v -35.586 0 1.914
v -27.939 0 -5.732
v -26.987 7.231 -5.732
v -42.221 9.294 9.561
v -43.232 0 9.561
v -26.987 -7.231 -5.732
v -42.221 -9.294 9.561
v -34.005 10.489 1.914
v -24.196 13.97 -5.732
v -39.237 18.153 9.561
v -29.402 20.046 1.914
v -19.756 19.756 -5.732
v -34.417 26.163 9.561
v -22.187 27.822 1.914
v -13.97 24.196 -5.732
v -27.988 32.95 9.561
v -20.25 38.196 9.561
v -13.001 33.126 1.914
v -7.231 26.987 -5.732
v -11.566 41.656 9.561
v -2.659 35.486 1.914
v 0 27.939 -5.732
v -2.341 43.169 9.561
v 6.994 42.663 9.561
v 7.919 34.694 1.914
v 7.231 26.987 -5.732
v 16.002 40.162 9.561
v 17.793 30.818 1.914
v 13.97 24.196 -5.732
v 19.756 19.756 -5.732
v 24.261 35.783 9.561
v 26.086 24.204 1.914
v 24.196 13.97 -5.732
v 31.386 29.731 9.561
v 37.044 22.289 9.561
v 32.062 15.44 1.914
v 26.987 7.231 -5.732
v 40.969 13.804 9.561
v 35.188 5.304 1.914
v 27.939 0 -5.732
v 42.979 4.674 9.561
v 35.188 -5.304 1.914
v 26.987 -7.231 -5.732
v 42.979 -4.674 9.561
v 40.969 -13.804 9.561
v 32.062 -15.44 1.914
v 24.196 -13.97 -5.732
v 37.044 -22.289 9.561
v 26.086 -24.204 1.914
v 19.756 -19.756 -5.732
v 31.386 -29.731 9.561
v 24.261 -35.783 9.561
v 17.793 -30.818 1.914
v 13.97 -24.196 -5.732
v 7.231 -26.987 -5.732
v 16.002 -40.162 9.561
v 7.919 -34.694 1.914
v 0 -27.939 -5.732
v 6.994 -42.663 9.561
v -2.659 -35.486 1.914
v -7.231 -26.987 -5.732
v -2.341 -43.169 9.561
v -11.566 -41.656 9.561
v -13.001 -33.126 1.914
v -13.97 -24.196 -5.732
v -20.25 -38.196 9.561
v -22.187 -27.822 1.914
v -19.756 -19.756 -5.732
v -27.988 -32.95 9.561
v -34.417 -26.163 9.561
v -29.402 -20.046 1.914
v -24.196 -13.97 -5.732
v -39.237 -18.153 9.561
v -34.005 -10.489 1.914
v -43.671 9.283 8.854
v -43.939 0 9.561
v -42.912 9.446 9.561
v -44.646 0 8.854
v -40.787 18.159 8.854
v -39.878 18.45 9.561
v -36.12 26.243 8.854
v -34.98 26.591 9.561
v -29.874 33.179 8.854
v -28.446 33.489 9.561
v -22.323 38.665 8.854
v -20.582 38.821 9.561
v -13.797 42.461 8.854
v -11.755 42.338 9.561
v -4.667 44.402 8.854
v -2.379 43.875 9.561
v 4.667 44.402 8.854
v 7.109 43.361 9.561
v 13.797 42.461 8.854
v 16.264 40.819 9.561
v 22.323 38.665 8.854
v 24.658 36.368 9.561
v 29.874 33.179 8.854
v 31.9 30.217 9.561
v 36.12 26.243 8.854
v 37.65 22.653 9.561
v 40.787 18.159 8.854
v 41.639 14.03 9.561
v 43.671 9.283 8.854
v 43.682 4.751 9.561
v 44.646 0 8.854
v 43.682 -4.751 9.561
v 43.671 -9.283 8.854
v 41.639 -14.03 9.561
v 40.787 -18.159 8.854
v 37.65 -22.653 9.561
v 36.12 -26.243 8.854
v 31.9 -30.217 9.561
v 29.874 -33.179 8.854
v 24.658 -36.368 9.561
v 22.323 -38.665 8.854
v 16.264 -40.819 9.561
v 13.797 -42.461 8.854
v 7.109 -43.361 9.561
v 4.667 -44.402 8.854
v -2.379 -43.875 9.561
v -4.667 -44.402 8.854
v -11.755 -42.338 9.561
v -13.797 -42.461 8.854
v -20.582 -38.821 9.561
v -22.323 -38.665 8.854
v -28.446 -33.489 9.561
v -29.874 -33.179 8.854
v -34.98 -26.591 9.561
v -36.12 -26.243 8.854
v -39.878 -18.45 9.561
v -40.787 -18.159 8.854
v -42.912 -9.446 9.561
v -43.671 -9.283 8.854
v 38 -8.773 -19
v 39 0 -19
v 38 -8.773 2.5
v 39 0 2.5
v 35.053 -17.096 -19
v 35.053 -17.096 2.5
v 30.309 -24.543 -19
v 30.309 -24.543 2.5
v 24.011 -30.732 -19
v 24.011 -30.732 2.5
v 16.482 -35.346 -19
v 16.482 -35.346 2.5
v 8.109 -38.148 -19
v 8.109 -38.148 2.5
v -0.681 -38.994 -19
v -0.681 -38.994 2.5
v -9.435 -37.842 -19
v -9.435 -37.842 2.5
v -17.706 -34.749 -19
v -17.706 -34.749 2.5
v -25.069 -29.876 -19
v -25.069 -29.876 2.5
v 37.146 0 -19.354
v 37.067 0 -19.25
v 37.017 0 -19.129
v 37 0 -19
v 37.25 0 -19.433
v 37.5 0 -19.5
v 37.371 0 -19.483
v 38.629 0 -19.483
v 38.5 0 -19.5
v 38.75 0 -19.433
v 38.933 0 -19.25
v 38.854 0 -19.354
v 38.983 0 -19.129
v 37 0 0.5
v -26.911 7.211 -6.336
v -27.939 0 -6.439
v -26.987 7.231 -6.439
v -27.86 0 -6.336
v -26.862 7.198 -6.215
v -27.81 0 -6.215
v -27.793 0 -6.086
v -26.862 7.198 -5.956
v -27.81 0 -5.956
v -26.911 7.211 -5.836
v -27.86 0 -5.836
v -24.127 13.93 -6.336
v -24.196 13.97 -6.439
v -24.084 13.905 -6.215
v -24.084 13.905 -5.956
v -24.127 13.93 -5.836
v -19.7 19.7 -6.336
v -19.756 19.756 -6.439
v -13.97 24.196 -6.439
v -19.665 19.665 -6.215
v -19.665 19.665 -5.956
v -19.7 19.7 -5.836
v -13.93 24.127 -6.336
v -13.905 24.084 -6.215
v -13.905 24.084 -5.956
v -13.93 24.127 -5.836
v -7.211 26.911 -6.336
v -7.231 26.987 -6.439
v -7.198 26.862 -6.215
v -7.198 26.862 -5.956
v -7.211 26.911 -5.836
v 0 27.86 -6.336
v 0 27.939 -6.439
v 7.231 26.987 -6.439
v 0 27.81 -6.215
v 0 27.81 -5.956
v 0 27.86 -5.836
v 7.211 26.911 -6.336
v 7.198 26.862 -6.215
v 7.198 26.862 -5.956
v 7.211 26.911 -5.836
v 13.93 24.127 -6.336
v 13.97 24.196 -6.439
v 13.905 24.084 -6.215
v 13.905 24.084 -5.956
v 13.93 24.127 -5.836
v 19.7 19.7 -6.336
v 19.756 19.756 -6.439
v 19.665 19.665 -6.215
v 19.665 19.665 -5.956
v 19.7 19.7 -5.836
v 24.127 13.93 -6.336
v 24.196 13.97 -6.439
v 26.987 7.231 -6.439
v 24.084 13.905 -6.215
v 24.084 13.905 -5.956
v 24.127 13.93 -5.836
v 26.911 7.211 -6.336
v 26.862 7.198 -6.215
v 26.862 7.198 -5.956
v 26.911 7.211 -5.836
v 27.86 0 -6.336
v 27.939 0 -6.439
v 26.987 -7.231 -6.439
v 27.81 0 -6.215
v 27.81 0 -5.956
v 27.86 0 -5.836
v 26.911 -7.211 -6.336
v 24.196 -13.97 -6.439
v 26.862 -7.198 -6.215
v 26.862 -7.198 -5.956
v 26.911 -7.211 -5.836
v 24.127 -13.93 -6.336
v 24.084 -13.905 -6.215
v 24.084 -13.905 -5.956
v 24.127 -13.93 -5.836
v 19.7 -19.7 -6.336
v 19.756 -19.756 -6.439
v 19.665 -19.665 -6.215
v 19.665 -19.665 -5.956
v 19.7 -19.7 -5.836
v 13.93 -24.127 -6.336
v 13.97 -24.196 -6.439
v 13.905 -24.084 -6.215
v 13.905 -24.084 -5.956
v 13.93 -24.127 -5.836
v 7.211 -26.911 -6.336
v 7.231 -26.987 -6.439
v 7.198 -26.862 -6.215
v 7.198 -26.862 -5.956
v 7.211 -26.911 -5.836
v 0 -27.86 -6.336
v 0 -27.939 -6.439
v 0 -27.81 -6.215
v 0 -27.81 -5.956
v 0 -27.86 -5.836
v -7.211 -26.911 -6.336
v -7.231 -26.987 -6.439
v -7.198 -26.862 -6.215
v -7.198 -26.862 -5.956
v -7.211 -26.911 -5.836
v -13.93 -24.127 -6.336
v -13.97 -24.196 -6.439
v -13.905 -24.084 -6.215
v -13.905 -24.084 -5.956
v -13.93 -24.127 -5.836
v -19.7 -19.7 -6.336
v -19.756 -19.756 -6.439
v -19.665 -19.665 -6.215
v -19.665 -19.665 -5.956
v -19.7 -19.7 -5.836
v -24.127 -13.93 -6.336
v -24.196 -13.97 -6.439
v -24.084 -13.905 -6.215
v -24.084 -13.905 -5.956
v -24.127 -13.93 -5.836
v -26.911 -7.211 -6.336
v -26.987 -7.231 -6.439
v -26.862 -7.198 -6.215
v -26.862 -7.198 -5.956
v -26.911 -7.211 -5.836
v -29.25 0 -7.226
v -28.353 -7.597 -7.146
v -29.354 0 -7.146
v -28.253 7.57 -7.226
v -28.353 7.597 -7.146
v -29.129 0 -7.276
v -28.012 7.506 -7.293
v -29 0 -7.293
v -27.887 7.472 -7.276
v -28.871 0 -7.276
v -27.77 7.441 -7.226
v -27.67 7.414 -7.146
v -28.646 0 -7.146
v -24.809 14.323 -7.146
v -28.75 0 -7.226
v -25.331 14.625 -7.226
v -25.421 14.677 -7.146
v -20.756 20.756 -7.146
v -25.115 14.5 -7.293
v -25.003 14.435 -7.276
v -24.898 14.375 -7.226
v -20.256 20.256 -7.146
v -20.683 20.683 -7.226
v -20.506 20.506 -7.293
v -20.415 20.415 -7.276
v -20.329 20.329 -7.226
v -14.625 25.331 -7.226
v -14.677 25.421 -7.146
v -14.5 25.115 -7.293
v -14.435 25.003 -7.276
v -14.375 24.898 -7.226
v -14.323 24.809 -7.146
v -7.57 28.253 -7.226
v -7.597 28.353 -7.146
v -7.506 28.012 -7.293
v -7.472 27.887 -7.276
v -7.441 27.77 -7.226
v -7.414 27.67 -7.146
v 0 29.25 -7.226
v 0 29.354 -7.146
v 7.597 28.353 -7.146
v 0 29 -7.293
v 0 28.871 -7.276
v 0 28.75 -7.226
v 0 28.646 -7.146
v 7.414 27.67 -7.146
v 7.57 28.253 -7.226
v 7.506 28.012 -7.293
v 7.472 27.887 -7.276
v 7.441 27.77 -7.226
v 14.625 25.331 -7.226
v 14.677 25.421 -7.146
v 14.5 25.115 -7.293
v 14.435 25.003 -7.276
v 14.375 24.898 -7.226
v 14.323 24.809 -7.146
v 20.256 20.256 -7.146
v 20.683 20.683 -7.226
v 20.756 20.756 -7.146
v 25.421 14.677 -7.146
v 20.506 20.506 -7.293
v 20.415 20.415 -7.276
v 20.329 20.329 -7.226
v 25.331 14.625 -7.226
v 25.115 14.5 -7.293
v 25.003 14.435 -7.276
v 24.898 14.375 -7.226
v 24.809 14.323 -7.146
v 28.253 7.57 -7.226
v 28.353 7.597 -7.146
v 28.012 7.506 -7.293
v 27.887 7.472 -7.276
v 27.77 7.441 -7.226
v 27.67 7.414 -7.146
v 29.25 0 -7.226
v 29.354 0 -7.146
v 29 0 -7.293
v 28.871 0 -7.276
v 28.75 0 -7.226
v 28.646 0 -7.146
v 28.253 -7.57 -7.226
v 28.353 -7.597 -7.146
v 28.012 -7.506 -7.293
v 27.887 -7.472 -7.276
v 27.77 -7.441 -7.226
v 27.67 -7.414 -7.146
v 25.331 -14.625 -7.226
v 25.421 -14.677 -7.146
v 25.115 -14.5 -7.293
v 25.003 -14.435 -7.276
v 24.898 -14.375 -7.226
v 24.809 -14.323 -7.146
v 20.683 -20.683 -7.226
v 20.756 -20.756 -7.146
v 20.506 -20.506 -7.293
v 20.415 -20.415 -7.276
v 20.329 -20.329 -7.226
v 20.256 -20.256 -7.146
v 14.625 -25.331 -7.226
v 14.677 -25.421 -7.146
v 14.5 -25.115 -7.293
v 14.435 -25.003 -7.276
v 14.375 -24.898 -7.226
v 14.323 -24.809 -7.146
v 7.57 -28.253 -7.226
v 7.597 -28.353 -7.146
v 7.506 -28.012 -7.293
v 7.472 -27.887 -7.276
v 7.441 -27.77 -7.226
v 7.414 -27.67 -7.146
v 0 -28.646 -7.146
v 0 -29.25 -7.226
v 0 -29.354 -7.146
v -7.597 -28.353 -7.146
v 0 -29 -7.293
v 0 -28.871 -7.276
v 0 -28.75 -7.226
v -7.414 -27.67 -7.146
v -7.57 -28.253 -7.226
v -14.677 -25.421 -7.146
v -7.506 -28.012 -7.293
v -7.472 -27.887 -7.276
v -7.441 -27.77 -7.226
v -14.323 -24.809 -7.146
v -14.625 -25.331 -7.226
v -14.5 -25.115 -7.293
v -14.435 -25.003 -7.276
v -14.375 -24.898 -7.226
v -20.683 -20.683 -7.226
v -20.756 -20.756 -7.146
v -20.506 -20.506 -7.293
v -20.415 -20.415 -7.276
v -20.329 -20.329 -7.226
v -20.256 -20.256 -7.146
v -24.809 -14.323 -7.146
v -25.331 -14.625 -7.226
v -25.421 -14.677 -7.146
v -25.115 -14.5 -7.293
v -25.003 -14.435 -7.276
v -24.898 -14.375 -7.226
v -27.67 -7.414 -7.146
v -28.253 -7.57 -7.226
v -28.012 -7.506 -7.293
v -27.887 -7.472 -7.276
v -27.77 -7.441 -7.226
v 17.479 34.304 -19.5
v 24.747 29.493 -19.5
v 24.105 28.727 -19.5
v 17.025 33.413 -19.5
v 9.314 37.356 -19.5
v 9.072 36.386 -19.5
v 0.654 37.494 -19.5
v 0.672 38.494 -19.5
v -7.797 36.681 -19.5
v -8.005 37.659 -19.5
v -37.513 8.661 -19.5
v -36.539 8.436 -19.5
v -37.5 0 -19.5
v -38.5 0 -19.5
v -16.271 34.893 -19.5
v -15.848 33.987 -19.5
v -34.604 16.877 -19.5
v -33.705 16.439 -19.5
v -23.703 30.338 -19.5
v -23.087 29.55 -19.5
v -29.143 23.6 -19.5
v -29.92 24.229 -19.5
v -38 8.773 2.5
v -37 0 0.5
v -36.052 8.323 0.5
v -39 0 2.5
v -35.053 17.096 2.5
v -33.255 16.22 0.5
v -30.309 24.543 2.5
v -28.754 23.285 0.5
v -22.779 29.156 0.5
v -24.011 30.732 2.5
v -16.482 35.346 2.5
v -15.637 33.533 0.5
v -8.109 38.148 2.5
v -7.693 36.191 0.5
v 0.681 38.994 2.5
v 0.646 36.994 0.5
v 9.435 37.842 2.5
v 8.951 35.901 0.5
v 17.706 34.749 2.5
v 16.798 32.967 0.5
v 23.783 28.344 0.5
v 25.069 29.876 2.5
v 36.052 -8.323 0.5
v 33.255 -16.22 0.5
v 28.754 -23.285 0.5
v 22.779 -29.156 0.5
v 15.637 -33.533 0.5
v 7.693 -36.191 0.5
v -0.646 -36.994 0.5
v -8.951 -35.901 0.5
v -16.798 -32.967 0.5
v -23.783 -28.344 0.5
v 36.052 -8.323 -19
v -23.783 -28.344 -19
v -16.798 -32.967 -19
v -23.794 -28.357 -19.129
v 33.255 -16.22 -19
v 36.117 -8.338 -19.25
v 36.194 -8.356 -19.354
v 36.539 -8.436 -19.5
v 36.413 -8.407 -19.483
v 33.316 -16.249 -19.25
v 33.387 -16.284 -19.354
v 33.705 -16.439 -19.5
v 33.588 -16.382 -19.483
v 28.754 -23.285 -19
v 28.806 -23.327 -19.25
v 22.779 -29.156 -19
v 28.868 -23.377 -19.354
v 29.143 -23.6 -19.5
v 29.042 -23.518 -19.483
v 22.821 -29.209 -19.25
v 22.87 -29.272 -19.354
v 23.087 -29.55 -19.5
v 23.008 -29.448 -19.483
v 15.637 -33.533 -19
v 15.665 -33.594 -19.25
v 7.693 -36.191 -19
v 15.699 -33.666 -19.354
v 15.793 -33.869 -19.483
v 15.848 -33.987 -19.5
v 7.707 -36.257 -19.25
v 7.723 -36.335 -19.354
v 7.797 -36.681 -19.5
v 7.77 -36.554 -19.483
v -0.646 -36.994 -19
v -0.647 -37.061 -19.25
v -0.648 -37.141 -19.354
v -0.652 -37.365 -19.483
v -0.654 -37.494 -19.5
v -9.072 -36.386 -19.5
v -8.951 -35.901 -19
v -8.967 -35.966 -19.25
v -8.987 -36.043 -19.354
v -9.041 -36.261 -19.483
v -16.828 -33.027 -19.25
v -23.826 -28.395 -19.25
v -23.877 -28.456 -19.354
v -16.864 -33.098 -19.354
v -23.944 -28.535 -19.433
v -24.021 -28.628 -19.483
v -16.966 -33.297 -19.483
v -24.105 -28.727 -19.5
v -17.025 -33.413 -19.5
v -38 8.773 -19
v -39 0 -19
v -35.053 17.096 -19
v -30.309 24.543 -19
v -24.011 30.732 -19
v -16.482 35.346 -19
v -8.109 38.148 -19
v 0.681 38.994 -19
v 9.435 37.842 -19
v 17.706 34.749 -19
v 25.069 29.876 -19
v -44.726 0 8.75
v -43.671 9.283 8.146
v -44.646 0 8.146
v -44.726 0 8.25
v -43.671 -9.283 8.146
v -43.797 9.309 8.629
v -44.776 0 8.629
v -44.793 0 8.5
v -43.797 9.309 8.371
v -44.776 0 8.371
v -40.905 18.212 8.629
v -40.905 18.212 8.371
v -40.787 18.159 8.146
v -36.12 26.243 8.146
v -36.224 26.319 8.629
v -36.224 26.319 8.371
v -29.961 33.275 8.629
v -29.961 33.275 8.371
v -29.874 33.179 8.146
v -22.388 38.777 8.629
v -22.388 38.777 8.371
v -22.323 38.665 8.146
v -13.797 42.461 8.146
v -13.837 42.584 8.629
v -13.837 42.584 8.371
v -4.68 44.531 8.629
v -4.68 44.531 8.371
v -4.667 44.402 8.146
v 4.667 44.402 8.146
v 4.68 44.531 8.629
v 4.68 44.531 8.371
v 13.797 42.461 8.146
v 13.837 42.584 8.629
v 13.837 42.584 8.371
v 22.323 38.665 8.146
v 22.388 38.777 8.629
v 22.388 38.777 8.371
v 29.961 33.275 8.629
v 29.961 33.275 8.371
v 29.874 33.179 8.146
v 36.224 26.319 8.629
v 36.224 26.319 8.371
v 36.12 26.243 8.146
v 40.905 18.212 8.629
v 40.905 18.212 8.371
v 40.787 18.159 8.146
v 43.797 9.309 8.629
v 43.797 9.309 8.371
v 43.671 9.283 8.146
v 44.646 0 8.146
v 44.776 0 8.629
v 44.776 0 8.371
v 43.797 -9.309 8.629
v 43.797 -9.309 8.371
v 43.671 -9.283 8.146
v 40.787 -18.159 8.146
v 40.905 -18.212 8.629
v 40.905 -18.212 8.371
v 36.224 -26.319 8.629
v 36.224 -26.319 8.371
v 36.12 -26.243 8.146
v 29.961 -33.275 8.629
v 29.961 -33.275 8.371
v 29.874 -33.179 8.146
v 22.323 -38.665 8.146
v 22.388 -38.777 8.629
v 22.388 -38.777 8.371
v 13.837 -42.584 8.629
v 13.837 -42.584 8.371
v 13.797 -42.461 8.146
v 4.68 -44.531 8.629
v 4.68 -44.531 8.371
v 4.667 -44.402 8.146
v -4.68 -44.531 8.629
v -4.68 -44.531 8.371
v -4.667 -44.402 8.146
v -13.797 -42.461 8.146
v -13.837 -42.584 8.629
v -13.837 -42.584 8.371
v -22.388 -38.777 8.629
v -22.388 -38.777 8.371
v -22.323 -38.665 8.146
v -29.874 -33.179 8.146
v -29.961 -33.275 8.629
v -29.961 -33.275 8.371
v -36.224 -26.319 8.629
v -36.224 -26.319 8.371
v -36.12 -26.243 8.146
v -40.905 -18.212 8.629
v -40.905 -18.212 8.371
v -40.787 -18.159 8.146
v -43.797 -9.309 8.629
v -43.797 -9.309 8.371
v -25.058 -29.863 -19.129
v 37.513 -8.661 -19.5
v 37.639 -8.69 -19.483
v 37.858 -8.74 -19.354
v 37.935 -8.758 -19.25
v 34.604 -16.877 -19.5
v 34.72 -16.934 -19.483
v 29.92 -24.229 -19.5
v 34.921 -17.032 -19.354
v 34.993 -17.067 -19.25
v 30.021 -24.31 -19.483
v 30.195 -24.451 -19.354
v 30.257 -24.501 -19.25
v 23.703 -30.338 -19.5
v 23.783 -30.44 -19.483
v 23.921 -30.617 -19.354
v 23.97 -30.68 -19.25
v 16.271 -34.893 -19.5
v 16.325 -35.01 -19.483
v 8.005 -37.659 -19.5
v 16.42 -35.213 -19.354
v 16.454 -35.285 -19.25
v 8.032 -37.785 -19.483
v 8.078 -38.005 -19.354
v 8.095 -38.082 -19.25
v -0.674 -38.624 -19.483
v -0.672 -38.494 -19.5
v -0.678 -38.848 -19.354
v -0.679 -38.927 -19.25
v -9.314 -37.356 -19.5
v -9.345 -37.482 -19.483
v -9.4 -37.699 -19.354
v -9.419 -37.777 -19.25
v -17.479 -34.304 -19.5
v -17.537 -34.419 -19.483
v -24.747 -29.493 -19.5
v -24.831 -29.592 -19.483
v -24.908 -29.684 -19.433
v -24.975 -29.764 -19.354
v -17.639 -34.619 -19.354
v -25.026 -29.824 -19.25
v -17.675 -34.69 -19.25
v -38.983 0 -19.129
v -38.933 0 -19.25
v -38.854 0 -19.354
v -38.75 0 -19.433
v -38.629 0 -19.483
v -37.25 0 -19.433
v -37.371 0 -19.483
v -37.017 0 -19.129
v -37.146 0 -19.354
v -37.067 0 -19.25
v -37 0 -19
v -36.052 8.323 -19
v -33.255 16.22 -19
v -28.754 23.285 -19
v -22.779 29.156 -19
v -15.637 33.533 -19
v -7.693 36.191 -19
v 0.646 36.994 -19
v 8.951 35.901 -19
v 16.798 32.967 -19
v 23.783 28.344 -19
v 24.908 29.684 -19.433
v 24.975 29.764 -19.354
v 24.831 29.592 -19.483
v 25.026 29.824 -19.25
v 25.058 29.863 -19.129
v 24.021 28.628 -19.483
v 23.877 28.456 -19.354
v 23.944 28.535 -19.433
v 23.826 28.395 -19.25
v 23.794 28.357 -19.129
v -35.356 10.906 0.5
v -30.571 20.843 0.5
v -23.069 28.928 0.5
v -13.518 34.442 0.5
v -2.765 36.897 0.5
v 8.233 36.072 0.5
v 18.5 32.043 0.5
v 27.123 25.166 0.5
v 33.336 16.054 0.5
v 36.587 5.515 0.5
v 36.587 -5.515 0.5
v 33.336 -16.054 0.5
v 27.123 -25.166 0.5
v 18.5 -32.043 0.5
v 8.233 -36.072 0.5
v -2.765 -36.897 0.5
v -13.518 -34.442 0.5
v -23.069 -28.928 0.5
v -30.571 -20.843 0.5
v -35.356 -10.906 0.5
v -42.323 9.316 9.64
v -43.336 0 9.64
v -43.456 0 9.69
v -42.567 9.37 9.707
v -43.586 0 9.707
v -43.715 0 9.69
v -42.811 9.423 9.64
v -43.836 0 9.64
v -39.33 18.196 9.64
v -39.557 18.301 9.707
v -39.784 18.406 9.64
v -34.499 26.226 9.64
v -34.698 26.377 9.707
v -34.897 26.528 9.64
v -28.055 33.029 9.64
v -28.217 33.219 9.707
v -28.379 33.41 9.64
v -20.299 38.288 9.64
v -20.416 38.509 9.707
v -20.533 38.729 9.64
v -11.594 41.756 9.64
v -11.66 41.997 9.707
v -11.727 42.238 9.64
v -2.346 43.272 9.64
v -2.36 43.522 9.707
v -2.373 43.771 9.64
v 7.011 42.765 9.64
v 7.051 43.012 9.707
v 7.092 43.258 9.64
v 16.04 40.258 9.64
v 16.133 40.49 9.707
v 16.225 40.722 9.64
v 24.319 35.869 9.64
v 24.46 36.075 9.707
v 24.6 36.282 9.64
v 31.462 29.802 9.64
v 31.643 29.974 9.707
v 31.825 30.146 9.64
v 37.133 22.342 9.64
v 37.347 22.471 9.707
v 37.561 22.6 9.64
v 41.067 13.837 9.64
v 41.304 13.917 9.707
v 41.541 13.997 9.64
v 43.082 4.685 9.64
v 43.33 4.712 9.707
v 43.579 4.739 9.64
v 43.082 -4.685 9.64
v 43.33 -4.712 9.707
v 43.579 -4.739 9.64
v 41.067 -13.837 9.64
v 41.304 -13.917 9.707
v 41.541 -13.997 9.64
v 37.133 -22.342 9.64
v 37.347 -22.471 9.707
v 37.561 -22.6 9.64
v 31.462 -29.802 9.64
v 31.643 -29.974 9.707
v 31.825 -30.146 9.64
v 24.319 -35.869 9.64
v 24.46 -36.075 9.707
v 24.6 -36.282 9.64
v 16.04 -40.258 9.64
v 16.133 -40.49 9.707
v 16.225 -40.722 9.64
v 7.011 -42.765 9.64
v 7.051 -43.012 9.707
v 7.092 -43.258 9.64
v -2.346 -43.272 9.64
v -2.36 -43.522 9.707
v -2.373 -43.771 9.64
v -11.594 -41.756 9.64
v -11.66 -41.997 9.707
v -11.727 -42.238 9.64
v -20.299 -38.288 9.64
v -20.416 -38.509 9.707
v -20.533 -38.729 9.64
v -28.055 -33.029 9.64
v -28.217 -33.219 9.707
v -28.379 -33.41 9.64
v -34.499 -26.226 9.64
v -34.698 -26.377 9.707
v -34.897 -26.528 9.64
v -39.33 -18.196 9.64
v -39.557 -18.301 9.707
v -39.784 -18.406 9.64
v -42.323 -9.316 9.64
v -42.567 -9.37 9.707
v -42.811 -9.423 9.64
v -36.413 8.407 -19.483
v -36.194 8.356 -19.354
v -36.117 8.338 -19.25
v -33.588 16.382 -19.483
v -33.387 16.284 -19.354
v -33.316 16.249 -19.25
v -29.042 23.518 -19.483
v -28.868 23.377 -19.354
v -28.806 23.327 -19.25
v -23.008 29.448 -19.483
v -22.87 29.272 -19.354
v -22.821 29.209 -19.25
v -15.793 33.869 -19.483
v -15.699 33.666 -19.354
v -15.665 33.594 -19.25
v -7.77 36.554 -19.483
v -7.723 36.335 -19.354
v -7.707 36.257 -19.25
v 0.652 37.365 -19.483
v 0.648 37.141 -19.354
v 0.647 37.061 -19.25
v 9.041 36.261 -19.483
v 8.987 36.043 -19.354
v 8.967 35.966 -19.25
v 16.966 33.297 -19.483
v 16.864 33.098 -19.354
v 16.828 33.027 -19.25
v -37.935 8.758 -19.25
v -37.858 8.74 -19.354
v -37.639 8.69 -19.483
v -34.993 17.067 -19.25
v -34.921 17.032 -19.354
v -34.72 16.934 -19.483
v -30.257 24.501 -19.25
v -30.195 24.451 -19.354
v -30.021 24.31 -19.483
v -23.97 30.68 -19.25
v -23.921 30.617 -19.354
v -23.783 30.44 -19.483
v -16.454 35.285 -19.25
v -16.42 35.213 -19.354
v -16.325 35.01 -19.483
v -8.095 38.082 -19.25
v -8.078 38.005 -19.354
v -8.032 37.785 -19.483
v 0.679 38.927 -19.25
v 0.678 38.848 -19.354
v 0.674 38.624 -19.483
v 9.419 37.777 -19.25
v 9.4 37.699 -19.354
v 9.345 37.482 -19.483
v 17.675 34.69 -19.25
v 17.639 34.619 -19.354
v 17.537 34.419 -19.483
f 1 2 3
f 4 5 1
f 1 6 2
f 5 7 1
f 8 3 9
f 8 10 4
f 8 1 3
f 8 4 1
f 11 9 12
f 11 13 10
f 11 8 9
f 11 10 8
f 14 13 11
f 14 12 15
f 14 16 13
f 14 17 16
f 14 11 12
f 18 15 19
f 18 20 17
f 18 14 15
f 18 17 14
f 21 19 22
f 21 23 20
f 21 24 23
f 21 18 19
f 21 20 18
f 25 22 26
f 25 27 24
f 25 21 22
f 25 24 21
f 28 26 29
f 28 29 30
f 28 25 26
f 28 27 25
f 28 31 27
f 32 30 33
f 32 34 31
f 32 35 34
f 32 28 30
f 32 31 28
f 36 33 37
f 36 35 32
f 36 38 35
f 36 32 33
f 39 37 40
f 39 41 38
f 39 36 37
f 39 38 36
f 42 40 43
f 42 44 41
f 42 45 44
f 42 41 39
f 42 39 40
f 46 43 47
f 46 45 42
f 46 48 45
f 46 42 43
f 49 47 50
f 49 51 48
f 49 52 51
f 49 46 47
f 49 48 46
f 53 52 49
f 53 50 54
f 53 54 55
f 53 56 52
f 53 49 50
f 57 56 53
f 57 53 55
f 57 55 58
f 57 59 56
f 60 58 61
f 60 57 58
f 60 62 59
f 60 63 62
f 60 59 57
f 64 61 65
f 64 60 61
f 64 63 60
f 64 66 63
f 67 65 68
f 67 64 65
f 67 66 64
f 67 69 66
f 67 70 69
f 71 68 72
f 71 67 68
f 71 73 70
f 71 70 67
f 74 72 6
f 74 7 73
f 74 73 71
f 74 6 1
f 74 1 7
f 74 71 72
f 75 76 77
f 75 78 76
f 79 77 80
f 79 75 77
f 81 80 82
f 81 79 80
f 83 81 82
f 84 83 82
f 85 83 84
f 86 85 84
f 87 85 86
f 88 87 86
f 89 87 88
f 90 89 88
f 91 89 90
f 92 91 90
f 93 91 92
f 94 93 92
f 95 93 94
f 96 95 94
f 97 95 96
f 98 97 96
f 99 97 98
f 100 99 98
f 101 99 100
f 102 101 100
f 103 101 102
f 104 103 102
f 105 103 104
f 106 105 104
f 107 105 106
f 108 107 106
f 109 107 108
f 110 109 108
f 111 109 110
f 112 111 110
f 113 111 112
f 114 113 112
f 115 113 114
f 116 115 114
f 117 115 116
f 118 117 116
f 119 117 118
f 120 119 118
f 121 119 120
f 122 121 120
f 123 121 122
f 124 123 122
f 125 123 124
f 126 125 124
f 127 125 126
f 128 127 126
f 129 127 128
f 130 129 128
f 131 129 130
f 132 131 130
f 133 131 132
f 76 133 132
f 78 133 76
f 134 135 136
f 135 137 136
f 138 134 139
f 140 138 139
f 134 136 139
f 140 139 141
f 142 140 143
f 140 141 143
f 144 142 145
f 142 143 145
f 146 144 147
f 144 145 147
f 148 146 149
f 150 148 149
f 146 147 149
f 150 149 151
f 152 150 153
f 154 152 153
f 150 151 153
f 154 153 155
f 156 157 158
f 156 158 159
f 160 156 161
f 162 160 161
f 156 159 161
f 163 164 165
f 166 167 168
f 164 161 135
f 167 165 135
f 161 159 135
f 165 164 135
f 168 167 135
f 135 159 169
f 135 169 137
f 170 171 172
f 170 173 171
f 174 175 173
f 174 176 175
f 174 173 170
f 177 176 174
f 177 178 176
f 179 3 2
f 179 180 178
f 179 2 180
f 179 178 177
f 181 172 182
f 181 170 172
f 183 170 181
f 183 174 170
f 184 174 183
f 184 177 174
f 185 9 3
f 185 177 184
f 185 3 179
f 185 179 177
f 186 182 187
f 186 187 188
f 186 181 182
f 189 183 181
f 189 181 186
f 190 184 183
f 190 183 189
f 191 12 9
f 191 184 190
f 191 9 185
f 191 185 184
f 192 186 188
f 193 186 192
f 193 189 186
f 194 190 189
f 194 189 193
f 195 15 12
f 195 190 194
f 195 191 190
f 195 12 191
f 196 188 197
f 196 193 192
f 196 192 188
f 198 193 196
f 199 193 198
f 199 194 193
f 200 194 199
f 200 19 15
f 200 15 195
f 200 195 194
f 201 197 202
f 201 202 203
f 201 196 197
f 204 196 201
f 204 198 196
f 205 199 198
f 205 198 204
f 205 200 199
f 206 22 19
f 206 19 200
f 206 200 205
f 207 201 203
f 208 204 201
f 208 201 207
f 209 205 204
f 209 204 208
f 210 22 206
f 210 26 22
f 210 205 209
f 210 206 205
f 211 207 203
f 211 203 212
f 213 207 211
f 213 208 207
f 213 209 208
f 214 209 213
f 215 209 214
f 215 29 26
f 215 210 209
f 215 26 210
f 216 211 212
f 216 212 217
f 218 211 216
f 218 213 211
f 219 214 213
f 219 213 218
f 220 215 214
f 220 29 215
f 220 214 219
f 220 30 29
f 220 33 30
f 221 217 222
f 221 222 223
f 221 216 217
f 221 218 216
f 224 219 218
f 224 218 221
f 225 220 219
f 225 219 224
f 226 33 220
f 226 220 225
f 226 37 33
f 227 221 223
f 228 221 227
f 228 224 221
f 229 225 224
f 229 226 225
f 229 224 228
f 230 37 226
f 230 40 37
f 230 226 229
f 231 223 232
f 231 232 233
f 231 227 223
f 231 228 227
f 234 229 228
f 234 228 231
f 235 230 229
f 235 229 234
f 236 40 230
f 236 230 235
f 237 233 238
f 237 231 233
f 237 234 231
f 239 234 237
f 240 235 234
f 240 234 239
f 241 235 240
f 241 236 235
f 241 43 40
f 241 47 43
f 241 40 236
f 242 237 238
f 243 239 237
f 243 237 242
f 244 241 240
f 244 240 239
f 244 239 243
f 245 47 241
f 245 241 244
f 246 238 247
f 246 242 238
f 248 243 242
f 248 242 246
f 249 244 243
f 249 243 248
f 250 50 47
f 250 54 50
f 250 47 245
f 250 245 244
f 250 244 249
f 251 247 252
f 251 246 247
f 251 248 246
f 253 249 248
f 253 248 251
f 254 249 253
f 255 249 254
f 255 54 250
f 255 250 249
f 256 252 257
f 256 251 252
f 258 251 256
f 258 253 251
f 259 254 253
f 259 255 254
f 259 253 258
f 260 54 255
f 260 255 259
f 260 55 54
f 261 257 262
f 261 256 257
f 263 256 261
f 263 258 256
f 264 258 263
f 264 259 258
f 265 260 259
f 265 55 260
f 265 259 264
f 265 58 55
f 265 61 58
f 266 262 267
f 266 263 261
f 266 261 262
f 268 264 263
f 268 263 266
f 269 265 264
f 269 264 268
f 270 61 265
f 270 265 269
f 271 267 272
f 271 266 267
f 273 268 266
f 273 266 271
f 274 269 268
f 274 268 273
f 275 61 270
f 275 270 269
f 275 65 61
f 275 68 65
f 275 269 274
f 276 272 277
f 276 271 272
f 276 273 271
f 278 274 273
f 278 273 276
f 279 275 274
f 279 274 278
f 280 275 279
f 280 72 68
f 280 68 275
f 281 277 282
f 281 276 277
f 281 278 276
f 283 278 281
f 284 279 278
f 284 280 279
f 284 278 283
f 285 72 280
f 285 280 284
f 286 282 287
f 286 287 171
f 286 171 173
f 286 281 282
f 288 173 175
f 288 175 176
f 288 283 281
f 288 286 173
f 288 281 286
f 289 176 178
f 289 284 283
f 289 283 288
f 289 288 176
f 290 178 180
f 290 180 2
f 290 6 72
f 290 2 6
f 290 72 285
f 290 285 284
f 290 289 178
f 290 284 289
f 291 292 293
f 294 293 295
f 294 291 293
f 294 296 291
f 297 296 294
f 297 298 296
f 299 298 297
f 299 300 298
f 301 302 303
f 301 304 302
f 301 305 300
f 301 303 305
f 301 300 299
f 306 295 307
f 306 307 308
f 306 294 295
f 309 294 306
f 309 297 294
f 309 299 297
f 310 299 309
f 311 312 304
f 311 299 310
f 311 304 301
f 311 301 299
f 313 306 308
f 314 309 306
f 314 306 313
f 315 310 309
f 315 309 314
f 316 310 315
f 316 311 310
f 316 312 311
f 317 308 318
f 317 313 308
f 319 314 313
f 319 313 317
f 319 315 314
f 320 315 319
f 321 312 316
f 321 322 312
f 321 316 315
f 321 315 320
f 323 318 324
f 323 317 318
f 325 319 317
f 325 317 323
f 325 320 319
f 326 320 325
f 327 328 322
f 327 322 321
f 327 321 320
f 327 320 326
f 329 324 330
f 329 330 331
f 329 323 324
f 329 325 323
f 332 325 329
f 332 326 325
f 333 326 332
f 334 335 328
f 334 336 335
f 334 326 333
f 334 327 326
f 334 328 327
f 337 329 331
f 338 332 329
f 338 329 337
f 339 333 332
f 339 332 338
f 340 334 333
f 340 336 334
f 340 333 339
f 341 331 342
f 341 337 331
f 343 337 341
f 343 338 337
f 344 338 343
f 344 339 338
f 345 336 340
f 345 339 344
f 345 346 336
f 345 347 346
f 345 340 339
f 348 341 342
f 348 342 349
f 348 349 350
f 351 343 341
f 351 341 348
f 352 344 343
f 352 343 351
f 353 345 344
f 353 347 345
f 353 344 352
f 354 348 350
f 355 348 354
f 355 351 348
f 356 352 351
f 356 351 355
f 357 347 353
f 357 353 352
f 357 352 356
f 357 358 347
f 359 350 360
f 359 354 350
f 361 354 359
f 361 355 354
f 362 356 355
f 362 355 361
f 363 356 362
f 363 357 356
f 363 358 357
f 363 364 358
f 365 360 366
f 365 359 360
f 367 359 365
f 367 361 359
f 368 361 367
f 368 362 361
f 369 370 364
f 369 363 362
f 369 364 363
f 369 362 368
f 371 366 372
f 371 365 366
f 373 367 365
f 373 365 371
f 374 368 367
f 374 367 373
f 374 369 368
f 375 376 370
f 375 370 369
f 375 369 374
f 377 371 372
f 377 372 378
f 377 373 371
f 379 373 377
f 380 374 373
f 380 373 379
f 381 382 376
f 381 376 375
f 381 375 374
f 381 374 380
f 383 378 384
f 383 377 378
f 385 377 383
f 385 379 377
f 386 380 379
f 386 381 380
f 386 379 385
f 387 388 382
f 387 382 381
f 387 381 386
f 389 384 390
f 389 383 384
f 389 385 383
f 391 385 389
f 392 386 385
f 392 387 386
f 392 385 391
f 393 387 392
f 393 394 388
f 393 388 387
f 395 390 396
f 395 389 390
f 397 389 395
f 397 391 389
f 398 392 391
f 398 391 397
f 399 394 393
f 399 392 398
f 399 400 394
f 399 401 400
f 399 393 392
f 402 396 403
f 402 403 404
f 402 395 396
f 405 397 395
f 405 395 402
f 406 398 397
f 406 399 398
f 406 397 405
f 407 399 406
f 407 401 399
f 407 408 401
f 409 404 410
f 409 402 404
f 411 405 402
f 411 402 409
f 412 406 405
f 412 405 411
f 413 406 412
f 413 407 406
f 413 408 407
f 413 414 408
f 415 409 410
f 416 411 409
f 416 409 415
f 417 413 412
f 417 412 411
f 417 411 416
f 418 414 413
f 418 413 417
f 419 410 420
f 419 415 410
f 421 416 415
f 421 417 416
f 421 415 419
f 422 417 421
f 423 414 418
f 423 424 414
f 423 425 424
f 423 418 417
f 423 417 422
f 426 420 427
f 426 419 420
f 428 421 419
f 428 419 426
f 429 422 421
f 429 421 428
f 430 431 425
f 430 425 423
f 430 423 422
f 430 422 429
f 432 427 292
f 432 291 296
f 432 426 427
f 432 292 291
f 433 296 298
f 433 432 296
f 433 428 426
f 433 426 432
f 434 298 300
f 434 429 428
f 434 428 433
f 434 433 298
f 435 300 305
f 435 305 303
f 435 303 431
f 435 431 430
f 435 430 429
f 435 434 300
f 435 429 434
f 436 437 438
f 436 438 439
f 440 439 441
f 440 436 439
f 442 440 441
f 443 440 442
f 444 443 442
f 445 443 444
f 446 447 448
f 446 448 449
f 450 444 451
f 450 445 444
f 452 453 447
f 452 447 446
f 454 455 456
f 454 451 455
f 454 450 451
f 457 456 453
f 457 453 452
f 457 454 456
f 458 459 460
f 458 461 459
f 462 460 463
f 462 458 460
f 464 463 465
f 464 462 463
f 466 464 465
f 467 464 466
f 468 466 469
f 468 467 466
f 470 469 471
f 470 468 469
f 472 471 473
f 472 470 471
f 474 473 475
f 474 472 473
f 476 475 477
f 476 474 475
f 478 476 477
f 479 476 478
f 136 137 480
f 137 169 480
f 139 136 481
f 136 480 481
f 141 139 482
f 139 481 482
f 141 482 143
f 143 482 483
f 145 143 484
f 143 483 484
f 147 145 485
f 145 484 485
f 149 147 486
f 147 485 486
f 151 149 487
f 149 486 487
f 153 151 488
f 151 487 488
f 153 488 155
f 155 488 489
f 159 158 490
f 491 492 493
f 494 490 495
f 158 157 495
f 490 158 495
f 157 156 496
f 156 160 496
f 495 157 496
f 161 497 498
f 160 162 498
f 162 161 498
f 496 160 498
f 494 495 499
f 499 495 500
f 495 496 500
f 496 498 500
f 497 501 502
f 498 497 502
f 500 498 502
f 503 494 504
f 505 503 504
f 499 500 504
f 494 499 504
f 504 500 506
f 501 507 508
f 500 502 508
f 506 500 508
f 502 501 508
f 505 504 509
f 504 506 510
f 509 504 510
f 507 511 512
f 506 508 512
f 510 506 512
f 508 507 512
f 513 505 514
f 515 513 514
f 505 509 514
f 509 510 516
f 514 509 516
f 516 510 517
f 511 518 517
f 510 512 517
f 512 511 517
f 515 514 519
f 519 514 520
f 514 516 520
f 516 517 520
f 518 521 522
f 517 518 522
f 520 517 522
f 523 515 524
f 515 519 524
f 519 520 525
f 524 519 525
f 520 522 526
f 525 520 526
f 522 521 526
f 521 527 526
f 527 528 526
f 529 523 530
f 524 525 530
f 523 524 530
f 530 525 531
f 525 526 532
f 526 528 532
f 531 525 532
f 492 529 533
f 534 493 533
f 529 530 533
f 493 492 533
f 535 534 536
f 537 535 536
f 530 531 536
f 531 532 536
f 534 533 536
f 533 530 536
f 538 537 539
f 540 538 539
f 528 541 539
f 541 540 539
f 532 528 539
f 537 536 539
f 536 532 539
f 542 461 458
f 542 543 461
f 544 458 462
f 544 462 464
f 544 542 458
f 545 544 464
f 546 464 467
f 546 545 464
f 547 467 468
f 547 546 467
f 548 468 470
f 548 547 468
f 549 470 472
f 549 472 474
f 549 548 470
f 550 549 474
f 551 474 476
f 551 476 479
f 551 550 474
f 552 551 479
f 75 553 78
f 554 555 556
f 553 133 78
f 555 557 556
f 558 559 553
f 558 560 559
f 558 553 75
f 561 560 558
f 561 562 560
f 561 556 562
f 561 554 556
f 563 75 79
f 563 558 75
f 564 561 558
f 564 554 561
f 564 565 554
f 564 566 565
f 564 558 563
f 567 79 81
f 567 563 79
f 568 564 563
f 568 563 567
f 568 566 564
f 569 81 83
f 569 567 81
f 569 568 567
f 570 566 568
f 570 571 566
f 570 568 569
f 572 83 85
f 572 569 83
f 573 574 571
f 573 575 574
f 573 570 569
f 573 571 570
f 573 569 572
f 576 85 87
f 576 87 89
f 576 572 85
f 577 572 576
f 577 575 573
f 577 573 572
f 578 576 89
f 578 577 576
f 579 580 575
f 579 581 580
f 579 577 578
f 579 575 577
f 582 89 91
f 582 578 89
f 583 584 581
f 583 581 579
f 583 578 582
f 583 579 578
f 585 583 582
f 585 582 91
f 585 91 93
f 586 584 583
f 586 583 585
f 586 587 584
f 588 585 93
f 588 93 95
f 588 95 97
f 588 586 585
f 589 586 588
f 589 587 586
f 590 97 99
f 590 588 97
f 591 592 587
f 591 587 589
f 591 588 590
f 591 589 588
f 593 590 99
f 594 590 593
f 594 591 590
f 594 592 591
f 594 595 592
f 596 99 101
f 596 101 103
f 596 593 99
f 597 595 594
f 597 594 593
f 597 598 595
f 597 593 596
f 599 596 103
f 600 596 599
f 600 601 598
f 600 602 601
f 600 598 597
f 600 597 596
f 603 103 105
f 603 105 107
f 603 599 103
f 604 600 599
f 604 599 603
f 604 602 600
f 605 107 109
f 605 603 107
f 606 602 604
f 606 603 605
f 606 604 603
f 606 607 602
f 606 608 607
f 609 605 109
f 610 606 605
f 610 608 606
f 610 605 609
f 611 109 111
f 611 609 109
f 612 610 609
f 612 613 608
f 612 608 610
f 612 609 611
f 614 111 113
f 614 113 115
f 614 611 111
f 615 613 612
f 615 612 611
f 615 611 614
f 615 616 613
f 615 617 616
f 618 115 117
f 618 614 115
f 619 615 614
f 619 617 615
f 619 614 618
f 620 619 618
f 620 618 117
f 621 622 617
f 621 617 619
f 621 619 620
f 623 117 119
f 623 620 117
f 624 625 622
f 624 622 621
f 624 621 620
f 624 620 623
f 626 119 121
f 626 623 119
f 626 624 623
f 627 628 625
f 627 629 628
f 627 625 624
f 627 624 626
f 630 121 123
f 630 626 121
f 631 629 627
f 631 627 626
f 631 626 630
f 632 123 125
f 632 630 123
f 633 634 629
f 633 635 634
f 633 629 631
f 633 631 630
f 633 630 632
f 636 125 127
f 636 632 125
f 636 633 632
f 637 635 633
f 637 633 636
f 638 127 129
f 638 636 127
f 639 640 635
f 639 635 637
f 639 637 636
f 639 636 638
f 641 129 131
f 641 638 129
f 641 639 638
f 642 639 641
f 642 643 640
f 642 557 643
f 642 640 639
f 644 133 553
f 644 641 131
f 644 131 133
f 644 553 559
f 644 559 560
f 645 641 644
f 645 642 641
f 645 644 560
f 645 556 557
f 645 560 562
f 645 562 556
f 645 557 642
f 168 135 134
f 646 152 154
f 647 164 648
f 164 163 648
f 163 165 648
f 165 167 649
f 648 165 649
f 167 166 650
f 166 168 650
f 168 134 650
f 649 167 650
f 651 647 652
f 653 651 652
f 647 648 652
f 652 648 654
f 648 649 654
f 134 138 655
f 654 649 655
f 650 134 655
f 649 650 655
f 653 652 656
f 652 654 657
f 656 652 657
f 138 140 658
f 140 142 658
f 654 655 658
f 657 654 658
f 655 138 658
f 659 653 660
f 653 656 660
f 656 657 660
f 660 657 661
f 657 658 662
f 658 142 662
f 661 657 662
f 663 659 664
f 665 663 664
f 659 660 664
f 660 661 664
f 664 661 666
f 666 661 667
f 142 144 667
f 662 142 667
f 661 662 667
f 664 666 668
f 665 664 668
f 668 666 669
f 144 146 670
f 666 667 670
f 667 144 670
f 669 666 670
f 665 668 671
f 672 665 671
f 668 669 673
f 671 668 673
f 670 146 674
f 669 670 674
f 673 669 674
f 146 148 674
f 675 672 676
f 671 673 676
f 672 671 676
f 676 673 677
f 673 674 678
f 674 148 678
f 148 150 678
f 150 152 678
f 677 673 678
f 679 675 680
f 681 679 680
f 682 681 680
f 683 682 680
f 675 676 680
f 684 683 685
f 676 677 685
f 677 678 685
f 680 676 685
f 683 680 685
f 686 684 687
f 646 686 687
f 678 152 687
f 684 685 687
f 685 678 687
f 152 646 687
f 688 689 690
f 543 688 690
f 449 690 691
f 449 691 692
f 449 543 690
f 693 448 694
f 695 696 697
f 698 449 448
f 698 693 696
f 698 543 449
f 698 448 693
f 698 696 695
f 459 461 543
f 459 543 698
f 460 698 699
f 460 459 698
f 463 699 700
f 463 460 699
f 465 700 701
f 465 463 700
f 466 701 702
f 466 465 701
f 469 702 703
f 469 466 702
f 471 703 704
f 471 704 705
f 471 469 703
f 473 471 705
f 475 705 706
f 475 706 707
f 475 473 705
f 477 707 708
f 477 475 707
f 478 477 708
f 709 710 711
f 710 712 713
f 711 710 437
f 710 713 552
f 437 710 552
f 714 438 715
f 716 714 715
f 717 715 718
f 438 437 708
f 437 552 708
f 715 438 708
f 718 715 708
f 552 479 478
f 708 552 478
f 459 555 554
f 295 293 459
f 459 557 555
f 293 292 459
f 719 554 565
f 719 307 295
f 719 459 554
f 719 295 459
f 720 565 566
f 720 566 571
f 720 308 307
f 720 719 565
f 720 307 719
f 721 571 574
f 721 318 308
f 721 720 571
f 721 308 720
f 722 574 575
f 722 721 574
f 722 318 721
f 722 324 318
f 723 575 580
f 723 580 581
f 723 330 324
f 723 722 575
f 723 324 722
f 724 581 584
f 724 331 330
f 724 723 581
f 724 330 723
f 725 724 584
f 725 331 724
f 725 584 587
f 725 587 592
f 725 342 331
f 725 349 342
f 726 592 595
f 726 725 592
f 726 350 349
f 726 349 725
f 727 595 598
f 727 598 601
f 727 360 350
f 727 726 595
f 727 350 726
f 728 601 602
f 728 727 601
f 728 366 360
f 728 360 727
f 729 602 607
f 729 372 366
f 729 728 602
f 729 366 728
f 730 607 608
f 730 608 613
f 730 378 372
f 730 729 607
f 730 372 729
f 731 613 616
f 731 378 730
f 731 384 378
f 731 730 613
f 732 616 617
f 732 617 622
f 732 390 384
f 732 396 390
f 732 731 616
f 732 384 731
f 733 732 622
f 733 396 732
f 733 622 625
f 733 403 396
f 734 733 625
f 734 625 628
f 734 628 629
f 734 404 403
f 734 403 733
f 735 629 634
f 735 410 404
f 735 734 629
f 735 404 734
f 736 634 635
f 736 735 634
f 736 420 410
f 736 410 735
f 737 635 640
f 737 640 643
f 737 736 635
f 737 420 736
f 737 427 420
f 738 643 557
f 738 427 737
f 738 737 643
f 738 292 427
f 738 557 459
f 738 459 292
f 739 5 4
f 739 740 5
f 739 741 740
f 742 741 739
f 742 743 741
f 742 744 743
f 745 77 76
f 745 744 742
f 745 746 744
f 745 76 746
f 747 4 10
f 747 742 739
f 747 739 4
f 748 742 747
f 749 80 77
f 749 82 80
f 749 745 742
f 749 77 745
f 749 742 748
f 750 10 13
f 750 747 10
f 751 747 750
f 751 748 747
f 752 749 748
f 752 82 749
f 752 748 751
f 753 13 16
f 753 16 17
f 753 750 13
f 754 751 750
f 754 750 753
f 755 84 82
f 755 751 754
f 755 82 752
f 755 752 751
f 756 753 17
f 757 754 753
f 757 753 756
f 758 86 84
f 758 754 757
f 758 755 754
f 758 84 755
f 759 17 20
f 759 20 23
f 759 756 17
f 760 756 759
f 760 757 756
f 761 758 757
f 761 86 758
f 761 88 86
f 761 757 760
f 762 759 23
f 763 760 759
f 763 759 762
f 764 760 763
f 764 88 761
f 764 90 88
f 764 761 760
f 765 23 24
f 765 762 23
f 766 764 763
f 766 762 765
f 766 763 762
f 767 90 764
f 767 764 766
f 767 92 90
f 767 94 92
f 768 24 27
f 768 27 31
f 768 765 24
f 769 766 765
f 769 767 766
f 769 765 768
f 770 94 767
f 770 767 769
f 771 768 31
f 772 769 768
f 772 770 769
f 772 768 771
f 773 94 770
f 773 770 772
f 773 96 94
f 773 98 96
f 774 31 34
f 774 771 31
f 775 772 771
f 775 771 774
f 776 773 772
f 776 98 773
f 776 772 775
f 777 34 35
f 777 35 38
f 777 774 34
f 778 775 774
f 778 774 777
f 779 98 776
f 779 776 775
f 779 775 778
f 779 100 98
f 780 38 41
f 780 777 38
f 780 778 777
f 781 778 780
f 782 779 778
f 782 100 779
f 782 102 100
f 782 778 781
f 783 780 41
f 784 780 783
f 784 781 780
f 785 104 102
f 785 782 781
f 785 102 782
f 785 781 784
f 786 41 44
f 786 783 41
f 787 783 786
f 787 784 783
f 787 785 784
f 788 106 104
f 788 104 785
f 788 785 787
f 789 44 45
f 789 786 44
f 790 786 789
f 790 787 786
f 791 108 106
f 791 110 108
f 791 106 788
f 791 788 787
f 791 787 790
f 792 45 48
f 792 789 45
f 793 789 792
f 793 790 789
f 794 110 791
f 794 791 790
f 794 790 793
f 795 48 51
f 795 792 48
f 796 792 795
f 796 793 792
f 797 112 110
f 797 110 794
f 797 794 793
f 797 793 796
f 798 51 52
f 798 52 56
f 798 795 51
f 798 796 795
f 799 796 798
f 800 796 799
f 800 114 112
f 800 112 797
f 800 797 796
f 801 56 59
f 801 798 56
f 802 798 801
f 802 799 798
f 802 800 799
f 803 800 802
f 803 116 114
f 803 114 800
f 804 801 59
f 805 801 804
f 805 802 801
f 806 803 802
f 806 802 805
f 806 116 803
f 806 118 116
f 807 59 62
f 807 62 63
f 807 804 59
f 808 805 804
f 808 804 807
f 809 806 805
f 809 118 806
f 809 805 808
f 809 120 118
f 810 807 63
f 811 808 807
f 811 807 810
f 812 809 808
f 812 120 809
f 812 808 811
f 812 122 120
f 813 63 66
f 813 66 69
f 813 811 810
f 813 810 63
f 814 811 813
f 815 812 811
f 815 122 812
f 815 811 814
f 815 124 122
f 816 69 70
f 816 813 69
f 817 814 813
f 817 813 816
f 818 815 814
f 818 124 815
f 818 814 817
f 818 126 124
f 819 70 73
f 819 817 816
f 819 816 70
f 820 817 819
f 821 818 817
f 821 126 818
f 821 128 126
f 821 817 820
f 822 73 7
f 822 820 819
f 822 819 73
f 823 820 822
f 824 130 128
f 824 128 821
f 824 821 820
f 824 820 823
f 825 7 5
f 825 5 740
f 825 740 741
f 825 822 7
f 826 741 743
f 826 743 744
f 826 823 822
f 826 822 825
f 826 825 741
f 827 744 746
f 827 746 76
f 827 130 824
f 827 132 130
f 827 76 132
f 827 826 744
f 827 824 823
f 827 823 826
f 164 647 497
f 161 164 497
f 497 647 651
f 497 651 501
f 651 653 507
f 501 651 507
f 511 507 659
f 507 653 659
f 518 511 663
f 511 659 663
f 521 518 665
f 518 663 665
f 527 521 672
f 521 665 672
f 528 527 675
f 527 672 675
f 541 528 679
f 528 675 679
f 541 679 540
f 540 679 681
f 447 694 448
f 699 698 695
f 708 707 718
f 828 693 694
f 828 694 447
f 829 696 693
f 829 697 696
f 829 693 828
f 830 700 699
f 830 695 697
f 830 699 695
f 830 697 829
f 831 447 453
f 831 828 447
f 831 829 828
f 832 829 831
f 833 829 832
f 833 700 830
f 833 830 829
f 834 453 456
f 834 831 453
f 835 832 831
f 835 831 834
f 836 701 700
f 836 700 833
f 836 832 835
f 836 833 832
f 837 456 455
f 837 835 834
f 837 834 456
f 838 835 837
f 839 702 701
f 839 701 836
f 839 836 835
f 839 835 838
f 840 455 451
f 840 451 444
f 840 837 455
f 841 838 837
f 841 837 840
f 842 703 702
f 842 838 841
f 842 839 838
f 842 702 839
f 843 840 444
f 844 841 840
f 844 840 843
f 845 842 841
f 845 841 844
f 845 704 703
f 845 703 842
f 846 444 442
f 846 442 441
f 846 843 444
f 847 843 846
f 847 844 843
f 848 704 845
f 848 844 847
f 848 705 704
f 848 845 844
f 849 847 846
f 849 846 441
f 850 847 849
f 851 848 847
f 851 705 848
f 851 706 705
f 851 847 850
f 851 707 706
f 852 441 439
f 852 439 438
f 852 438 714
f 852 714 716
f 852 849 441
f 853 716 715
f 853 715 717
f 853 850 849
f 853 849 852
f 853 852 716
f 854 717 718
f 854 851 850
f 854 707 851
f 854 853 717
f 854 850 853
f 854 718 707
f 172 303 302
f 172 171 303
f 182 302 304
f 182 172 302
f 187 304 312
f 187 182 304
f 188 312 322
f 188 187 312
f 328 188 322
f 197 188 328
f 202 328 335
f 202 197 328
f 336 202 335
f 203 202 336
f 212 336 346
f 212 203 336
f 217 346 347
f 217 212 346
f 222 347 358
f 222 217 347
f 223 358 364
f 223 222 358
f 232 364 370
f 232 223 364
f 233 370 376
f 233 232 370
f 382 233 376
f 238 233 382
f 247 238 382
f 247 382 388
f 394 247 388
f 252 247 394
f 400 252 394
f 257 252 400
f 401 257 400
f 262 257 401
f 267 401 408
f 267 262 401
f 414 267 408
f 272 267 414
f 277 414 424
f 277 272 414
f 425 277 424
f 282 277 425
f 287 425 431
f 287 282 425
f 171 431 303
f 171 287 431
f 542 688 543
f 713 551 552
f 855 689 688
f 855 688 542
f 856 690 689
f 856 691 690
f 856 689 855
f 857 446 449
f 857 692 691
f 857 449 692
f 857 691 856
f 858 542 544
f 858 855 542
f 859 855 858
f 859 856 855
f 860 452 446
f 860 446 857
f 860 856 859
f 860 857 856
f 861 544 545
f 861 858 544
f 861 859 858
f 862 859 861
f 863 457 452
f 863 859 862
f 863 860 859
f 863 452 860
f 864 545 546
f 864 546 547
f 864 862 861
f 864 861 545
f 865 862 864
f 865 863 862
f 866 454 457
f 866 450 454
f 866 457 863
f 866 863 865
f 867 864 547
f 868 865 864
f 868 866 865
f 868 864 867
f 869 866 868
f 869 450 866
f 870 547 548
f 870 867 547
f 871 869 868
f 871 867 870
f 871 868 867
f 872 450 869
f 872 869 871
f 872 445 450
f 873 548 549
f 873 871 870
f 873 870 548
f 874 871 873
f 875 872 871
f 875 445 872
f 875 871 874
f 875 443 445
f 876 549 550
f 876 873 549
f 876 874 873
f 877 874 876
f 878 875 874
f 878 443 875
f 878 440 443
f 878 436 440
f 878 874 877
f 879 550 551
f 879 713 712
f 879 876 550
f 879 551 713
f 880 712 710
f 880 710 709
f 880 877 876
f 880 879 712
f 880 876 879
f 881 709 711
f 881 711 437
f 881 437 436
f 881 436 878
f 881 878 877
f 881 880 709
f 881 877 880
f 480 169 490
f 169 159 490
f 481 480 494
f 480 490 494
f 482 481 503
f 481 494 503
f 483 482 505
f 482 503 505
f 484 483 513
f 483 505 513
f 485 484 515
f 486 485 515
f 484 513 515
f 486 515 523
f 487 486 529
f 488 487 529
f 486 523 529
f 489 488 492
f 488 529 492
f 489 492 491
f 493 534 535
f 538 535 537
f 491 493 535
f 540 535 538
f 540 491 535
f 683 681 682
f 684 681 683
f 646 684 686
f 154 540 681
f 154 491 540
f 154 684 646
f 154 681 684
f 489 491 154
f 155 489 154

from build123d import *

# Parameters (mm, degrees)
F3_ANGLE = 130


with BuildPart() as f3:
    # F0 (on Front) → F3 (revolve)
    with BuildSketch(Plane.XZ):
        with BuildLine():
            Line((-39, 2.5), (-39, 2))
            Line((-39, 2), (-39, -19))
            ThreePointArc((-39, -19), (-38.853553, -19.353553), (-38.5, -19.5))
            Line((-38.5, -19.5), (-37.5, -19.5))
            ThreePointArc((-37.5, -19.5), (-37.146447, -19.353553), (-37, -19))
            Line((-37, -19), (-37, 0))
            Line((-37, 0), (-37, 0.5))
            Line((-37, 0.5), (-39, 2.5))
        make_face()
        with BuildLine():
            Line((39, -19), (39, 2))
            Line((39, 2), (39, 2.5))
            Line((39, 2.5), (37, 0.5))
            Line((37, 0.5), (37, 0))
            Line((37, 0), (37, -19))
            ThreePointArc((37, -19), (37.146447, -19.353553), (37.5, -19.5))
            Line((37.5, -19.5), (38.5, -19.5))
            ThreePointArc((38.5, -19.5), (38.853553, -19.353553), (39, -19))
        make_face()
    revolve(axis=Axis((0, 0, -10.309674), (0, 0, -1)), revolution_arc=F3_ANGLE)


with BuildPart() as f5:
    # F2 (on Front) → F5 (revolve)
    with BuildSketch(Plane.XZ):
        with BuildLine():
            ThreePointArc((-29.353553, -7.146447), (-29, -7.292893), (-28.646447, -7.146447))
            Line((-28.646447, -7.146447), (-27.93934, -6.43934))
            ThreePointArc((-27.93934, -6.43934), (-27.792893, -6.085786), (-27.93934, -5.732233))
            Line((-27.93934, -5.732233), (-43.232233, 9.56066))
            ThreePointArc((-43.232233, 9.56066), (-43.585786, 9.707107), (-43.93934, 9.56066))
            Line((-43.93934, 9.56066), (-44.646447, 8.853553))
            ThreePointArc((-44.646447, 8.853553), (-44.792893, 8.5), (-44.646447, 8.146447))
            Line((-44.646447, 8.146447), (-29.353553, -7.146447))
        make_face()
    revolve(axis=Axis((0, 0, -11.544993), (0, 0, -1)))


solid = Compound([f3.part, f5.part])
